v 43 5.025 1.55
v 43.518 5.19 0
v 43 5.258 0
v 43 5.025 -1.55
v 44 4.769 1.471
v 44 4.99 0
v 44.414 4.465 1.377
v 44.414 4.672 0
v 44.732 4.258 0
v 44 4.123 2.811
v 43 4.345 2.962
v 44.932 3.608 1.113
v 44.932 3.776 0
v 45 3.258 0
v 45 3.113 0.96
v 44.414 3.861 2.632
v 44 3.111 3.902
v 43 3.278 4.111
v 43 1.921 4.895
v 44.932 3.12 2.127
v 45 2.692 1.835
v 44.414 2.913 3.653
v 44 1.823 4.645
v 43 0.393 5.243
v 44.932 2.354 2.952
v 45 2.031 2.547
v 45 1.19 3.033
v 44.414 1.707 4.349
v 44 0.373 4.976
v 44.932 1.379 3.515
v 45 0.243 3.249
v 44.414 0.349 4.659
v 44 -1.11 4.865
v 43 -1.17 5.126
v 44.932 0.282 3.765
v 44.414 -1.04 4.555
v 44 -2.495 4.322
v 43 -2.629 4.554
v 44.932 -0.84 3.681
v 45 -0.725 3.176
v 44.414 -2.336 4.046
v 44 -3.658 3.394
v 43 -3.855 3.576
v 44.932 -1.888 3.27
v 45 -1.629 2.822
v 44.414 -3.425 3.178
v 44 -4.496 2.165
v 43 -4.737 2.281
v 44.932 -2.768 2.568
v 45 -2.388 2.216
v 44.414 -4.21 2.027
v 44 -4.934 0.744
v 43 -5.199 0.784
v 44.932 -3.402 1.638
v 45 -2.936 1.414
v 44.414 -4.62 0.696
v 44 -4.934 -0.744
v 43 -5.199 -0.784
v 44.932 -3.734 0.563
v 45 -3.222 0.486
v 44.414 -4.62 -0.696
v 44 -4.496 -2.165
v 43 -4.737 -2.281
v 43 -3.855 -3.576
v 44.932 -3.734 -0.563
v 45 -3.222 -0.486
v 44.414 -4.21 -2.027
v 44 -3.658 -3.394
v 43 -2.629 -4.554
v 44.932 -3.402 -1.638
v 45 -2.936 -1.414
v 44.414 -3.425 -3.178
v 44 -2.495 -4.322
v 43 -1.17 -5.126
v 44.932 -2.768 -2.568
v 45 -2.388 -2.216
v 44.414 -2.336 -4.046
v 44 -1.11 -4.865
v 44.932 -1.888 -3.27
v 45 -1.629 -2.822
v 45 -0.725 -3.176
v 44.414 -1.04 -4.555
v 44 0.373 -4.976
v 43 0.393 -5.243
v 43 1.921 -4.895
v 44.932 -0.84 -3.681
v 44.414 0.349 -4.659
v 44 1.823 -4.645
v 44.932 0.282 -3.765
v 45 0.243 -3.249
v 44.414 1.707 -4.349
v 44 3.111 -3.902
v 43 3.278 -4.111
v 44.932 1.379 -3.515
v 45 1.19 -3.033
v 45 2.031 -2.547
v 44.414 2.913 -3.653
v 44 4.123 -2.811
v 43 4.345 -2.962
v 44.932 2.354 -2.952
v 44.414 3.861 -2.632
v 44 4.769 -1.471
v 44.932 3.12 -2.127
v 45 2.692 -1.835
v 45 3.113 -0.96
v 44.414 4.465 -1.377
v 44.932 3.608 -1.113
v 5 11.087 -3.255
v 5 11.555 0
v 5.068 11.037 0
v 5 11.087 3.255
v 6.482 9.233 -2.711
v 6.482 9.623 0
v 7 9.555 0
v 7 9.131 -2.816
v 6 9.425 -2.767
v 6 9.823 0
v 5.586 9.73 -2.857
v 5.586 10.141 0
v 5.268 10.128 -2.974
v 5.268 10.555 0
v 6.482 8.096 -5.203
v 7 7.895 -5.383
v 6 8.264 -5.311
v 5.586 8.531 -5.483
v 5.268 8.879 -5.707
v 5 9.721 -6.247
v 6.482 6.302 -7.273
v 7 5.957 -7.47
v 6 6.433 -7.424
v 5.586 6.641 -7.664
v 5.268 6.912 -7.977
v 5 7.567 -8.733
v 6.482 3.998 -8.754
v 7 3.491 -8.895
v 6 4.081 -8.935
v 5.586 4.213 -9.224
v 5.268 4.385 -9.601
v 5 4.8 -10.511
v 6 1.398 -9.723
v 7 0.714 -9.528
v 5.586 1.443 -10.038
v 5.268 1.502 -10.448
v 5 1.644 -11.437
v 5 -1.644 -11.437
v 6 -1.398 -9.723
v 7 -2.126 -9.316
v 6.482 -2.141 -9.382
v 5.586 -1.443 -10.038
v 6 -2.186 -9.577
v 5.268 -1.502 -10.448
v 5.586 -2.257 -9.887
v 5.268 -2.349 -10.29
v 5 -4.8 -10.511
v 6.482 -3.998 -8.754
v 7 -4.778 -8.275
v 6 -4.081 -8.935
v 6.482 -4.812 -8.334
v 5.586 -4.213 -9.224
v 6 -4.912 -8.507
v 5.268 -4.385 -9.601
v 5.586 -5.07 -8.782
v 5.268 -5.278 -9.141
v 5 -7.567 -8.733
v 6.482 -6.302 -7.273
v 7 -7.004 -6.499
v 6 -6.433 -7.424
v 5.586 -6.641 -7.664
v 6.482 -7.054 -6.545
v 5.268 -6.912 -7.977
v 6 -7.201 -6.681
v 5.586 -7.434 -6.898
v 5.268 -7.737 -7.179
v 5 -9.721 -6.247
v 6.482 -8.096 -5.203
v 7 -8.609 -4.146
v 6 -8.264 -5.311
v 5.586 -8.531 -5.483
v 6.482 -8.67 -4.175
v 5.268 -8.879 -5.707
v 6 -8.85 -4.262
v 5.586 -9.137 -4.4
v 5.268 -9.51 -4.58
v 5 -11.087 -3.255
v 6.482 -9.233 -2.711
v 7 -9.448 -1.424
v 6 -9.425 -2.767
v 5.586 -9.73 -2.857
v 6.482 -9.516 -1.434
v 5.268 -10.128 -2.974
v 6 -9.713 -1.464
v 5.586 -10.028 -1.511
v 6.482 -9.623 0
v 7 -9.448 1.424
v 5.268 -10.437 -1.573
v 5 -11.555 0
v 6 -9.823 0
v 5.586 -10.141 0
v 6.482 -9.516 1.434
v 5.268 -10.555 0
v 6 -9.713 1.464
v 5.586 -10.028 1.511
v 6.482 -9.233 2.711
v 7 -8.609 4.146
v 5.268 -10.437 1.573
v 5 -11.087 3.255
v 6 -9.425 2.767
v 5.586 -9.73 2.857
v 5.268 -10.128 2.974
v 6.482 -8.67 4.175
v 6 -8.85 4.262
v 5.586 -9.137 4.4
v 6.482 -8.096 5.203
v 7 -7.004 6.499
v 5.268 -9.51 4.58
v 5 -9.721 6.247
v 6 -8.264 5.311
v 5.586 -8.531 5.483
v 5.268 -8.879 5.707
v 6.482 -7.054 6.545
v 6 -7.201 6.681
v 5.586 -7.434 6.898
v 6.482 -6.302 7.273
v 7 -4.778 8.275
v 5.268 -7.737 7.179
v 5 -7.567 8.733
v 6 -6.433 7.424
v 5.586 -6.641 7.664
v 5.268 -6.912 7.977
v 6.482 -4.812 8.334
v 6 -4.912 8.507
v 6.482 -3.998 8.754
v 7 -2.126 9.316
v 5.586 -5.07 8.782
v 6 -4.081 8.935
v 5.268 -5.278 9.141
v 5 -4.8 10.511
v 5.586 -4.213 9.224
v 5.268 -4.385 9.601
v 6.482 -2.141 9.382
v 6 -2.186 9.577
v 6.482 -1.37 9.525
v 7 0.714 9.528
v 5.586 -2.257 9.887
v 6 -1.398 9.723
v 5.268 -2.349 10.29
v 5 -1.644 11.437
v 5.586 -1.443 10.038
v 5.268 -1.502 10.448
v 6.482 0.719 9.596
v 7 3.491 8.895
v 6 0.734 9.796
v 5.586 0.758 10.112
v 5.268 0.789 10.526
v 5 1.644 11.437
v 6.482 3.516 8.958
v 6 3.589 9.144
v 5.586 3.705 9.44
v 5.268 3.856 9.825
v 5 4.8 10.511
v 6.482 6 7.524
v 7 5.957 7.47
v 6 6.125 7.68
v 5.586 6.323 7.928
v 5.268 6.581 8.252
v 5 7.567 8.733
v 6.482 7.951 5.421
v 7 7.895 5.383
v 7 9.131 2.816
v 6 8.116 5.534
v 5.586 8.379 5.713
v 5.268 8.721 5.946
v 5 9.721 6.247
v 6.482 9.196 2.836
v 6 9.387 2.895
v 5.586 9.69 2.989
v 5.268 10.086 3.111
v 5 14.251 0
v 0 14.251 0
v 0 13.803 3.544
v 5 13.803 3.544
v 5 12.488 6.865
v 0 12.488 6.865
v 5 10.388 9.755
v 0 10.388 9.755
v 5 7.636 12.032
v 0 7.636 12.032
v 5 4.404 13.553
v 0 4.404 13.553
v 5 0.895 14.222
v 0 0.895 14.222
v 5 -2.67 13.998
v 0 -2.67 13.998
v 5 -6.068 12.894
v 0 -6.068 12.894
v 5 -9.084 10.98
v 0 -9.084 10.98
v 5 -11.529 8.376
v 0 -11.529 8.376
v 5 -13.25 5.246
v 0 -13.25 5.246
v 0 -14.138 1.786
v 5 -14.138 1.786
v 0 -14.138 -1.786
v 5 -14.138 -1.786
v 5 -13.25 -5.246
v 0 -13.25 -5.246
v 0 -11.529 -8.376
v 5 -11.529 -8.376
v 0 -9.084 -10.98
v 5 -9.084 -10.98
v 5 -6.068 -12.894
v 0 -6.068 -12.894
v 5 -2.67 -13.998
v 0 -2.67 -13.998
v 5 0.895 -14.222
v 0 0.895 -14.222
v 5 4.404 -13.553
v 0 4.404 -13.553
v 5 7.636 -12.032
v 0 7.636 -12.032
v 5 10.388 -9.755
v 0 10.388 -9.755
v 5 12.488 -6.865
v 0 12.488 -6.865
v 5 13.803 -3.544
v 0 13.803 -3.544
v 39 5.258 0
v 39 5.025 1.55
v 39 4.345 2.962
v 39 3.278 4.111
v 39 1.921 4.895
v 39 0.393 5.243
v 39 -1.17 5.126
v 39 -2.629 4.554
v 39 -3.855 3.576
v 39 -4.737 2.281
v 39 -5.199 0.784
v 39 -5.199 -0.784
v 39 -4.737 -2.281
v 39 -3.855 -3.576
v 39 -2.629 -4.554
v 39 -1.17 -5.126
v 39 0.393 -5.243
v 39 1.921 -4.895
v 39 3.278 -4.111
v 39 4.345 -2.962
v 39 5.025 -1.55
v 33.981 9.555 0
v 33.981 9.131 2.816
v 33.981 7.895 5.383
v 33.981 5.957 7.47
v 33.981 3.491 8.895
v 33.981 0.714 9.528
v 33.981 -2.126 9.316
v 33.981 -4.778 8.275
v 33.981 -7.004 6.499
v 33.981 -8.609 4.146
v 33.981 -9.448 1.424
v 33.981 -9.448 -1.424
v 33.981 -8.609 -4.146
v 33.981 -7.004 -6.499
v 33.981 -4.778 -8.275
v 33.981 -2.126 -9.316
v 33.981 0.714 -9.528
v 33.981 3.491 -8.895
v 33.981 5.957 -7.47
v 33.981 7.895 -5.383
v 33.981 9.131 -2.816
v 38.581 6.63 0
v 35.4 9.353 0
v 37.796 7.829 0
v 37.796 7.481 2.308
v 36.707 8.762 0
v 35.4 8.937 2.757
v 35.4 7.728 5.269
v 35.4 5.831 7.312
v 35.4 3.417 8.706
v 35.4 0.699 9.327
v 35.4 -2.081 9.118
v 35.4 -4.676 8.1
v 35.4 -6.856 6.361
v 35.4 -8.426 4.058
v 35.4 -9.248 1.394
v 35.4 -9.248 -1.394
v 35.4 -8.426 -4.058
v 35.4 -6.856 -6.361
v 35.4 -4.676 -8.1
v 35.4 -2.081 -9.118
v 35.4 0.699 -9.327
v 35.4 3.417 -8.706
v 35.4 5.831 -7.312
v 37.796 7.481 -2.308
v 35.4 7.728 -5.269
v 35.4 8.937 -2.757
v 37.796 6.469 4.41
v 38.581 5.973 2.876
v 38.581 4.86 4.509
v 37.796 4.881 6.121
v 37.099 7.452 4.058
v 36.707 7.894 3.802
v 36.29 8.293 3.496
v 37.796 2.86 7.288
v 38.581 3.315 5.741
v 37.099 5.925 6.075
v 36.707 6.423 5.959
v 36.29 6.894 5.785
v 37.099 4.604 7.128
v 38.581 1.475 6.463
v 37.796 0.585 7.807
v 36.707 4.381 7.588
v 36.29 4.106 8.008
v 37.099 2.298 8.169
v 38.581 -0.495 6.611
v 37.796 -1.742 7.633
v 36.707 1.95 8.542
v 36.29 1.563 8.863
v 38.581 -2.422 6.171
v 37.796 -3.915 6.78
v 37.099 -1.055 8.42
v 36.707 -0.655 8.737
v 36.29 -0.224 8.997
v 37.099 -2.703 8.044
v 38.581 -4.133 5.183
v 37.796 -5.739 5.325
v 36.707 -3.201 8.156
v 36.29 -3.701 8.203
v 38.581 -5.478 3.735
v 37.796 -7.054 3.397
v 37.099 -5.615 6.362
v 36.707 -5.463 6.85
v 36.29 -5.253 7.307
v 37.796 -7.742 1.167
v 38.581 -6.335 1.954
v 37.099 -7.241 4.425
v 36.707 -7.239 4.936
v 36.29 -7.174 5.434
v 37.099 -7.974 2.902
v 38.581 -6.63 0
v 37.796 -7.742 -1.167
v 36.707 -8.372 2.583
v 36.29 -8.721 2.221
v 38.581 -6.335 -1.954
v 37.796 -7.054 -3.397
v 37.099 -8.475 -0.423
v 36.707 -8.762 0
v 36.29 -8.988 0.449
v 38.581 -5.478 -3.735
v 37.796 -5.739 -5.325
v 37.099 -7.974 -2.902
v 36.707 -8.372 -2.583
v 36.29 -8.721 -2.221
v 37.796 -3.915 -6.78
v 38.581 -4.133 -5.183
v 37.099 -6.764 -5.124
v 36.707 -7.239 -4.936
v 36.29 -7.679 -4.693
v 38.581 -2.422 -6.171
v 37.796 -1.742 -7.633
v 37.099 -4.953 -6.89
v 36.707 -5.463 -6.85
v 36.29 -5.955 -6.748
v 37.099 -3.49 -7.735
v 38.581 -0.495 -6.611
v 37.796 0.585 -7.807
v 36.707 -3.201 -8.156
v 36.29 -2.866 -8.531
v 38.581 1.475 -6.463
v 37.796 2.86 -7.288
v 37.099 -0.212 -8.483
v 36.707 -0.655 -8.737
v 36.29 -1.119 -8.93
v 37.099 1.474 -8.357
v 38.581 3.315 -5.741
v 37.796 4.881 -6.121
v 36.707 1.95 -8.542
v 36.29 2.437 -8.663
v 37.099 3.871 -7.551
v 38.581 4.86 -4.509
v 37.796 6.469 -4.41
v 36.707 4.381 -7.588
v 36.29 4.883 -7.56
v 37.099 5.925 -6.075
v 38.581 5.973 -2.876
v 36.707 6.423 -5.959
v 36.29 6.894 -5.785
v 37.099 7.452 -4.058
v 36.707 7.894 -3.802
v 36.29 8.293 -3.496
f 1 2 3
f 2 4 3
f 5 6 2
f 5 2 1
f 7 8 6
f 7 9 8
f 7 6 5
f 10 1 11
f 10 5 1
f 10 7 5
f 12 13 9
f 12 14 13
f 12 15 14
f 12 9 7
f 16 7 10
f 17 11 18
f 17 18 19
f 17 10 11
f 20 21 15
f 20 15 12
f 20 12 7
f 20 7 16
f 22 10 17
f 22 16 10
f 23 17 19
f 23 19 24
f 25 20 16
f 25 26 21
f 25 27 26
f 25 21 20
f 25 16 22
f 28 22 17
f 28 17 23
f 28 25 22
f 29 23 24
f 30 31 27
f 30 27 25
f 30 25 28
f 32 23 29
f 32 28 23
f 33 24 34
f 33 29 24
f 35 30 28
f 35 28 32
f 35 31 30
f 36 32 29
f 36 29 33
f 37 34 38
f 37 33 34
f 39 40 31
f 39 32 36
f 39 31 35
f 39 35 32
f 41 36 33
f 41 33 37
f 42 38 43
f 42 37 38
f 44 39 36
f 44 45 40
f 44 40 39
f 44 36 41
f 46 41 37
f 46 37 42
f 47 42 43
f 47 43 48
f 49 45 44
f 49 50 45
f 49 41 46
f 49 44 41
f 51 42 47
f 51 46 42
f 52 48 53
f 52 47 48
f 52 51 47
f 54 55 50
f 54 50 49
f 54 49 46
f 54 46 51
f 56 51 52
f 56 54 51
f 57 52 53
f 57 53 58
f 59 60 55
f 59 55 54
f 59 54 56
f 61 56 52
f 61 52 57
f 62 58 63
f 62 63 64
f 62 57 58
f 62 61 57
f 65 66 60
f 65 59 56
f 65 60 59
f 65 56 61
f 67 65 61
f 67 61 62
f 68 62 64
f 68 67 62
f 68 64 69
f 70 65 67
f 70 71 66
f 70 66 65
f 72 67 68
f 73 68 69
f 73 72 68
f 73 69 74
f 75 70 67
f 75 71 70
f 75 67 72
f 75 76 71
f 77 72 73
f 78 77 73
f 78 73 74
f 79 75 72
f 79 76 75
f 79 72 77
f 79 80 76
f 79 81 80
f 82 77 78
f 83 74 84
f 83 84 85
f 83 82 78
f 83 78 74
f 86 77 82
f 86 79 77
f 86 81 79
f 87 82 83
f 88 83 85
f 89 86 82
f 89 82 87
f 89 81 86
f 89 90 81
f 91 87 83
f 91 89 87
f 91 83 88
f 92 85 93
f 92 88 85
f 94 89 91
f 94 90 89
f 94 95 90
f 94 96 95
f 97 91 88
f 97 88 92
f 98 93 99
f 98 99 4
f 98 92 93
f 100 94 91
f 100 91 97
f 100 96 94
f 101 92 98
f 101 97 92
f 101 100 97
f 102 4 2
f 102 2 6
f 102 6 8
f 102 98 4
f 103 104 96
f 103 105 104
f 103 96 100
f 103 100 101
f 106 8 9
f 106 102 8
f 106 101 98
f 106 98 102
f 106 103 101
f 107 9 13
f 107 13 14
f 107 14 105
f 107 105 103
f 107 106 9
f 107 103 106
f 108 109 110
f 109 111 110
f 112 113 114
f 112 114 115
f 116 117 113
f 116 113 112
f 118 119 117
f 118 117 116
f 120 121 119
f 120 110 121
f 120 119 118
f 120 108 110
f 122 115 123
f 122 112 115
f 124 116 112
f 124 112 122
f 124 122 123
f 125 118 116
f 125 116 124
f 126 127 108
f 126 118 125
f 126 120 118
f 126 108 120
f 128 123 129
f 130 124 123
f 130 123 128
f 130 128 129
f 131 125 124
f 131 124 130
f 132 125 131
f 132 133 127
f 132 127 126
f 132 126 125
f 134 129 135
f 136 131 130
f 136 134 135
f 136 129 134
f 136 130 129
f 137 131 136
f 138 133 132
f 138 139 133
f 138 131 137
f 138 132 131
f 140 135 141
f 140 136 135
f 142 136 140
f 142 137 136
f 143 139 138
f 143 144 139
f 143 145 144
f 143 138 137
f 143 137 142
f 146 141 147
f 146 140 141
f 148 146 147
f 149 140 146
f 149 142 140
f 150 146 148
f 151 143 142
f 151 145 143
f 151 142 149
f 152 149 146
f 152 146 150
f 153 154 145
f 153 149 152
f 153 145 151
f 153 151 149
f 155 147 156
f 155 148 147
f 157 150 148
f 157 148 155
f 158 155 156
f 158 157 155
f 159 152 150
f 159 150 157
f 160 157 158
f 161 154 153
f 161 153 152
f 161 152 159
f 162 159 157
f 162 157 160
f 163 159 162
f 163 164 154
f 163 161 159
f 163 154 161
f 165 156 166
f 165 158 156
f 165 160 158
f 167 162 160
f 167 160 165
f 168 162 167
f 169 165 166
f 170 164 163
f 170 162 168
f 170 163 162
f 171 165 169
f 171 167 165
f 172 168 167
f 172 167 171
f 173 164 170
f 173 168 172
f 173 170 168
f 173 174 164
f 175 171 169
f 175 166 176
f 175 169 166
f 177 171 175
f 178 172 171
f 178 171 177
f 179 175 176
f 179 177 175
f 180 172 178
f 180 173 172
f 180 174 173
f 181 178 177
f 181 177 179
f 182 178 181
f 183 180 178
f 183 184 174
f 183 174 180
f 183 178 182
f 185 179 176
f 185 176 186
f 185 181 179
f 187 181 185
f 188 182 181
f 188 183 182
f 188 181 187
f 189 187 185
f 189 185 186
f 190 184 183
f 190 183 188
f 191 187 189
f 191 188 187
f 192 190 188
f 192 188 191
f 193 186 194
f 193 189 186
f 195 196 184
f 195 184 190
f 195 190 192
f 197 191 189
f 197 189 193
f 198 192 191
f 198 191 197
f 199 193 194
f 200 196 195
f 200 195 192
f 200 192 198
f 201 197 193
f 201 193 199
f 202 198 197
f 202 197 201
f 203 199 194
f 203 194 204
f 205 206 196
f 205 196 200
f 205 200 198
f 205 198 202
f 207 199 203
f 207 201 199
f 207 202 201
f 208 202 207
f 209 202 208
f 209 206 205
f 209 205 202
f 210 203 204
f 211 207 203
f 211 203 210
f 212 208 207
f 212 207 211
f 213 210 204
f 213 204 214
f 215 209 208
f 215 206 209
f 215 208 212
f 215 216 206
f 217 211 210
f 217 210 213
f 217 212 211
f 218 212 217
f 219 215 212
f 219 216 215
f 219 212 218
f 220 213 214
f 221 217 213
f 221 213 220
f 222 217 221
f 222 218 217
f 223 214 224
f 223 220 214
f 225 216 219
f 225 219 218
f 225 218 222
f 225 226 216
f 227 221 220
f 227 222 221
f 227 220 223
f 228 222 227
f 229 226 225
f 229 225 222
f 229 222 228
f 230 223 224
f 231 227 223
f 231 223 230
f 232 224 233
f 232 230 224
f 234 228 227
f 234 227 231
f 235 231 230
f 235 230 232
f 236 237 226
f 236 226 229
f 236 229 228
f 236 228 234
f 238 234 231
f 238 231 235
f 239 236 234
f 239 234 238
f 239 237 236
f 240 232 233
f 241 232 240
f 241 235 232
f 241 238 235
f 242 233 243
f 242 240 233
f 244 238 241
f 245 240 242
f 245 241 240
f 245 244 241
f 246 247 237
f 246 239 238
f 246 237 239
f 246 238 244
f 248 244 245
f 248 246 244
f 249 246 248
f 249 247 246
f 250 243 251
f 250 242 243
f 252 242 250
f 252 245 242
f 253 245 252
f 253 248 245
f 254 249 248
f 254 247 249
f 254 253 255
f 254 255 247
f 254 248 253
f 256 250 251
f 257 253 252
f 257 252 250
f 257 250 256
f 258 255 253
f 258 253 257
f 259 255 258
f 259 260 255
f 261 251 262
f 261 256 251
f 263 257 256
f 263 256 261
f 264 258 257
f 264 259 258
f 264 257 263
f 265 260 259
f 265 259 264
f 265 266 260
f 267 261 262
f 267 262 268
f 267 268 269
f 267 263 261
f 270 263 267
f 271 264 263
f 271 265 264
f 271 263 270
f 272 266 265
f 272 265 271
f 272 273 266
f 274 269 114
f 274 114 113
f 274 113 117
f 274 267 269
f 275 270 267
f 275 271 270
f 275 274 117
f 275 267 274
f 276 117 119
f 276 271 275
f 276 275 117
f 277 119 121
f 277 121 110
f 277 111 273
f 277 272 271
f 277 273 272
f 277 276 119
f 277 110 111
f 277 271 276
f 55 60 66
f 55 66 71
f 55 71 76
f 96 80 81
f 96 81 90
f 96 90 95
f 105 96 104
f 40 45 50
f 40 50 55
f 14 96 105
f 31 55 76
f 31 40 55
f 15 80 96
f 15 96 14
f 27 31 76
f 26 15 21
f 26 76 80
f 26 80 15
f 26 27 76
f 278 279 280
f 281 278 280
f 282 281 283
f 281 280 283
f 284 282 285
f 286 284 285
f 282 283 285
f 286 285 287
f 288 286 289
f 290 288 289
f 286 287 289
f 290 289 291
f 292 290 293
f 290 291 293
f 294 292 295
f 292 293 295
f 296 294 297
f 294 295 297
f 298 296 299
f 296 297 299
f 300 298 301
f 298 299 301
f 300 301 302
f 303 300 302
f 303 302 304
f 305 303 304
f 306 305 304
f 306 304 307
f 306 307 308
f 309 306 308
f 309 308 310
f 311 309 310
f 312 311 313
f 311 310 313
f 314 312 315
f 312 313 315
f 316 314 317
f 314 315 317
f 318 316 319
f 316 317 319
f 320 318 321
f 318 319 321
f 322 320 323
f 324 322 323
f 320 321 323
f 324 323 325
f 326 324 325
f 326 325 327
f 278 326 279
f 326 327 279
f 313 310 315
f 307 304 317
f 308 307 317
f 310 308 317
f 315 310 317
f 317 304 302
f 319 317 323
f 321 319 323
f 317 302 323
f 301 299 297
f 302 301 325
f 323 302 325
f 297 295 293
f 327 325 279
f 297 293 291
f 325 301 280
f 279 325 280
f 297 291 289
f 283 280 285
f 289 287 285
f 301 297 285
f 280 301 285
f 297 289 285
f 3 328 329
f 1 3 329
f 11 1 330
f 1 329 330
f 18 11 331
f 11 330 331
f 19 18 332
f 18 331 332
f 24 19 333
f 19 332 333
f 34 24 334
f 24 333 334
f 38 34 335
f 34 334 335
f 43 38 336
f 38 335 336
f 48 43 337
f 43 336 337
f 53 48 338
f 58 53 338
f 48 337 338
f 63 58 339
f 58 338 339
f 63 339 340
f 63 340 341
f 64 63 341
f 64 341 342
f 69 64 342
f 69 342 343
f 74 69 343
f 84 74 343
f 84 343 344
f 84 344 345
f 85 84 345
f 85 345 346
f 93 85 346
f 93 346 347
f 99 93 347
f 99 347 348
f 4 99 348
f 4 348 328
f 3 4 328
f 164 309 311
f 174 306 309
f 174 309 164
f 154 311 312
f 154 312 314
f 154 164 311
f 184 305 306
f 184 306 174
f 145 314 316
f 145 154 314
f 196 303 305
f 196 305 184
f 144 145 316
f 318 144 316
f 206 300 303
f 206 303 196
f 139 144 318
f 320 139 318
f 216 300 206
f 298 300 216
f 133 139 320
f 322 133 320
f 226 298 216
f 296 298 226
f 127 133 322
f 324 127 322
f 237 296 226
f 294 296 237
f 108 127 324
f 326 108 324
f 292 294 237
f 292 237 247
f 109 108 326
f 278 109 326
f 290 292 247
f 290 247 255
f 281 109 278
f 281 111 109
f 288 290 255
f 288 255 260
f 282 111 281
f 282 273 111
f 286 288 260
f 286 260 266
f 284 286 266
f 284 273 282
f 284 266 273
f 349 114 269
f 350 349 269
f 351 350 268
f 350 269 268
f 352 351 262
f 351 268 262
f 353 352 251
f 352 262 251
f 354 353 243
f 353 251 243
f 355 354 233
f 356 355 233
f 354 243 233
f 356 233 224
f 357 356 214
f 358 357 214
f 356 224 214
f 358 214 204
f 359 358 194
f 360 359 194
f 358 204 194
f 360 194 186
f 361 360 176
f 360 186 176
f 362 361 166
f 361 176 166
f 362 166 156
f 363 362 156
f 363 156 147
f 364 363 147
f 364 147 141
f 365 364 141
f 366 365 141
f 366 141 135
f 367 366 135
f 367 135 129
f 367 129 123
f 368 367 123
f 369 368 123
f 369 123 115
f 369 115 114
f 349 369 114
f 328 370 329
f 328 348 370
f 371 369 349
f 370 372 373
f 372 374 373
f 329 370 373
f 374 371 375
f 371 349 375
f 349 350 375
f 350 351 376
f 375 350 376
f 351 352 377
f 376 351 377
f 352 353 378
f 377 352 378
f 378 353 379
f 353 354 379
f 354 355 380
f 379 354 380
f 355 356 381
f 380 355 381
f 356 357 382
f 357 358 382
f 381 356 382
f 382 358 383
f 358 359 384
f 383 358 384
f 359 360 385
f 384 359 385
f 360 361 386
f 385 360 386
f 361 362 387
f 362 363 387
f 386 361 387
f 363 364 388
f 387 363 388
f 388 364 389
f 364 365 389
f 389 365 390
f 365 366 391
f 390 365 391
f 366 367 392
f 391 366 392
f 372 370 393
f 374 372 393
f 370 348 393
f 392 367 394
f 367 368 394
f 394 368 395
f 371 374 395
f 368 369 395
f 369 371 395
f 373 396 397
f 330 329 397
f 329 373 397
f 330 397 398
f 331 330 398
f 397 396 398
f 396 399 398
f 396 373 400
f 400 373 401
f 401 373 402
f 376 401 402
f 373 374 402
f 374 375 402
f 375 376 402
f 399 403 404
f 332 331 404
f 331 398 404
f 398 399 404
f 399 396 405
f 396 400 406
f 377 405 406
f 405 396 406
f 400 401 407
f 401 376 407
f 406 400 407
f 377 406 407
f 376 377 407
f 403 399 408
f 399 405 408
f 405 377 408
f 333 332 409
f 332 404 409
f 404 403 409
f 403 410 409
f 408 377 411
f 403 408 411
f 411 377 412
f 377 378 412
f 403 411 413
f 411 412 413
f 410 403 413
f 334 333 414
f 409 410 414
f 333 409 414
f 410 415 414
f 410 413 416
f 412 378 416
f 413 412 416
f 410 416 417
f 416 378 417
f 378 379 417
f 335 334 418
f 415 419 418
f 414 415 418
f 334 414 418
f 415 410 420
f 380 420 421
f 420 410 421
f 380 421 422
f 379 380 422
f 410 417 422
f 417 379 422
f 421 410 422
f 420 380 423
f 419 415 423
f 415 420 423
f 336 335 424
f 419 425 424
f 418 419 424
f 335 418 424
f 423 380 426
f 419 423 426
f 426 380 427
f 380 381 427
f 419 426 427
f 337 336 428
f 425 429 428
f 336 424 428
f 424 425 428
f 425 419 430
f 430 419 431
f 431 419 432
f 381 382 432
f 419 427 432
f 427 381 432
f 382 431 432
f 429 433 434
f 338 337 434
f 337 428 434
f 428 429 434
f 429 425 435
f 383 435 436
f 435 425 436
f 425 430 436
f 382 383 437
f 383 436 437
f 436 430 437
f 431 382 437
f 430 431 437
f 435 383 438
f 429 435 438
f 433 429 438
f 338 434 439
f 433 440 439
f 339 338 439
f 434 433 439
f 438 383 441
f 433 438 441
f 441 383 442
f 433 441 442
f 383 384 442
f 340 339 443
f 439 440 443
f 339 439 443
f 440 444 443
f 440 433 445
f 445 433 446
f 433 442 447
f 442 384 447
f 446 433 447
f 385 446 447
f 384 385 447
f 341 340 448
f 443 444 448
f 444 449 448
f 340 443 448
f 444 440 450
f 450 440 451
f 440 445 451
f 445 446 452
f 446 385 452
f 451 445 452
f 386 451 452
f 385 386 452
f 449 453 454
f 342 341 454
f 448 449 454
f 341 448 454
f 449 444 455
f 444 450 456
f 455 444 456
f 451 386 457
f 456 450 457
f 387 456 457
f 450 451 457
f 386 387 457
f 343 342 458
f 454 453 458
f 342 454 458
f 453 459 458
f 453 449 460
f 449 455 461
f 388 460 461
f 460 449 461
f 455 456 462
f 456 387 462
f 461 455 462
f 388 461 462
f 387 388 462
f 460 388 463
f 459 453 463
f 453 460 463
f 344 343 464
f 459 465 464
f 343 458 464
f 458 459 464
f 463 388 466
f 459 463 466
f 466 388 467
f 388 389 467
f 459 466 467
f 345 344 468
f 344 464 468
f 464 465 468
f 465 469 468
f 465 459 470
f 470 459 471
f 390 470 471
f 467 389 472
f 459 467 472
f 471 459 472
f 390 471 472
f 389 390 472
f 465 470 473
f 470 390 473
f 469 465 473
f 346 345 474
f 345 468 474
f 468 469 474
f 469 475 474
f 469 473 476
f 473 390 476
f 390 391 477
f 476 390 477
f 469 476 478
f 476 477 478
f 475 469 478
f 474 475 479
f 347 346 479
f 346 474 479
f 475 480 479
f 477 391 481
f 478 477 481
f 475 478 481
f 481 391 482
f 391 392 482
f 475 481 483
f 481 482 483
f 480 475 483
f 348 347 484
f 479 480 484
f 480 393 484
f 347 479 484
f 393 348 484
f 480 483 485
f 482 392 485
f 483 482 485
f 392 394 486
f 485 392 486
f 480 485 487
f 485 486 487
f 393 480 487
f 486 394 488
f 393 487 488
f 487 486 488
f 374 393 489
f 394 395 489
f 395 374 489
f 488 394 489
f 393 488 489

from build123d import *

# Parameters (mm, degrees)
F0_R      = 5.258166692
F12_DEPTH = 45
F1_R      = 9.5550685652
F2_DEPTH  = 39
F13_R     = 14.2505021401
F3_DEPTH  = 5
F4_R      = 2
F6_R      = 2
F10_W     = 1.8654689193
F10_H     = 2.0018368959
F11_DEPTH = 45


# Not quite as in the source:
# - a fillet or chamfer that OpenCascade refuses, or shapes differently, is made with other operations: its cross-section is extruded or revolved along the edge and cut away or added
# - the program builds the solid bodies; features that only make, move or delete a surface that nothing else refers to are left out


with BuildPart() as f12:
    # F0 (on Right) → F12 (new body)
    with BuildSketch(Plane.YZ):
        Circle(F0_R)
    extrude(amount=F12_DEPTH)

    # F1 (on Right) → F2 (join)
    with BuildSketch(Plane.YZ):
        Circle(F1_R)
    extrude(amount=F2_DEPTH)

    # F13 (on Right) → F3 (join)
    with BuildSketch(Plane.YZ):
        Circle(F13_R)
    extrude(amount=F3_DEPTH)

    # F4
    f4_edges = [f12.edges().sort_by_distance(p)[0] for p in [
        (45, -5.258167, 0),
    ]]
    fillet(f4_edges, radius=F4_R)

    # F5: fillet of radius 5.08 on 1 edges, made by hand

    # F5_s1 → F5_t2 (revolve, cut)
    with BuildSketch(Plane.XY):
        with BuildLine():
            ThreePointArc((39, 5.258166692), (37.2843755862, 8.3341188683), (33.9807214339, 9.5550685652))
            Line((33.9807214339, 9.5550685652), (39, 9.5550685652))
            Line((39, 9.5550685652), (39, 5.258166692))
        make_face()
    revolve(axis=Axis((39, 0, 0), (1, 0, 0)), mode=Mode.SUBTRACT)

    # F6
    f6_edges = [f12.edges().sort_by_distance(p)[0] for p in [
        (5, -9.555069, 0),
    ]]
    fillet(f6_edges, radius=F6_R)

    # F10 (on Right) → F11 (join)
    with BuildSketch(Plane.YZ):
        Rectangle(F10_W, F10_H)
    extrude(amount=F11_DEPTH)


solid = f12.part
